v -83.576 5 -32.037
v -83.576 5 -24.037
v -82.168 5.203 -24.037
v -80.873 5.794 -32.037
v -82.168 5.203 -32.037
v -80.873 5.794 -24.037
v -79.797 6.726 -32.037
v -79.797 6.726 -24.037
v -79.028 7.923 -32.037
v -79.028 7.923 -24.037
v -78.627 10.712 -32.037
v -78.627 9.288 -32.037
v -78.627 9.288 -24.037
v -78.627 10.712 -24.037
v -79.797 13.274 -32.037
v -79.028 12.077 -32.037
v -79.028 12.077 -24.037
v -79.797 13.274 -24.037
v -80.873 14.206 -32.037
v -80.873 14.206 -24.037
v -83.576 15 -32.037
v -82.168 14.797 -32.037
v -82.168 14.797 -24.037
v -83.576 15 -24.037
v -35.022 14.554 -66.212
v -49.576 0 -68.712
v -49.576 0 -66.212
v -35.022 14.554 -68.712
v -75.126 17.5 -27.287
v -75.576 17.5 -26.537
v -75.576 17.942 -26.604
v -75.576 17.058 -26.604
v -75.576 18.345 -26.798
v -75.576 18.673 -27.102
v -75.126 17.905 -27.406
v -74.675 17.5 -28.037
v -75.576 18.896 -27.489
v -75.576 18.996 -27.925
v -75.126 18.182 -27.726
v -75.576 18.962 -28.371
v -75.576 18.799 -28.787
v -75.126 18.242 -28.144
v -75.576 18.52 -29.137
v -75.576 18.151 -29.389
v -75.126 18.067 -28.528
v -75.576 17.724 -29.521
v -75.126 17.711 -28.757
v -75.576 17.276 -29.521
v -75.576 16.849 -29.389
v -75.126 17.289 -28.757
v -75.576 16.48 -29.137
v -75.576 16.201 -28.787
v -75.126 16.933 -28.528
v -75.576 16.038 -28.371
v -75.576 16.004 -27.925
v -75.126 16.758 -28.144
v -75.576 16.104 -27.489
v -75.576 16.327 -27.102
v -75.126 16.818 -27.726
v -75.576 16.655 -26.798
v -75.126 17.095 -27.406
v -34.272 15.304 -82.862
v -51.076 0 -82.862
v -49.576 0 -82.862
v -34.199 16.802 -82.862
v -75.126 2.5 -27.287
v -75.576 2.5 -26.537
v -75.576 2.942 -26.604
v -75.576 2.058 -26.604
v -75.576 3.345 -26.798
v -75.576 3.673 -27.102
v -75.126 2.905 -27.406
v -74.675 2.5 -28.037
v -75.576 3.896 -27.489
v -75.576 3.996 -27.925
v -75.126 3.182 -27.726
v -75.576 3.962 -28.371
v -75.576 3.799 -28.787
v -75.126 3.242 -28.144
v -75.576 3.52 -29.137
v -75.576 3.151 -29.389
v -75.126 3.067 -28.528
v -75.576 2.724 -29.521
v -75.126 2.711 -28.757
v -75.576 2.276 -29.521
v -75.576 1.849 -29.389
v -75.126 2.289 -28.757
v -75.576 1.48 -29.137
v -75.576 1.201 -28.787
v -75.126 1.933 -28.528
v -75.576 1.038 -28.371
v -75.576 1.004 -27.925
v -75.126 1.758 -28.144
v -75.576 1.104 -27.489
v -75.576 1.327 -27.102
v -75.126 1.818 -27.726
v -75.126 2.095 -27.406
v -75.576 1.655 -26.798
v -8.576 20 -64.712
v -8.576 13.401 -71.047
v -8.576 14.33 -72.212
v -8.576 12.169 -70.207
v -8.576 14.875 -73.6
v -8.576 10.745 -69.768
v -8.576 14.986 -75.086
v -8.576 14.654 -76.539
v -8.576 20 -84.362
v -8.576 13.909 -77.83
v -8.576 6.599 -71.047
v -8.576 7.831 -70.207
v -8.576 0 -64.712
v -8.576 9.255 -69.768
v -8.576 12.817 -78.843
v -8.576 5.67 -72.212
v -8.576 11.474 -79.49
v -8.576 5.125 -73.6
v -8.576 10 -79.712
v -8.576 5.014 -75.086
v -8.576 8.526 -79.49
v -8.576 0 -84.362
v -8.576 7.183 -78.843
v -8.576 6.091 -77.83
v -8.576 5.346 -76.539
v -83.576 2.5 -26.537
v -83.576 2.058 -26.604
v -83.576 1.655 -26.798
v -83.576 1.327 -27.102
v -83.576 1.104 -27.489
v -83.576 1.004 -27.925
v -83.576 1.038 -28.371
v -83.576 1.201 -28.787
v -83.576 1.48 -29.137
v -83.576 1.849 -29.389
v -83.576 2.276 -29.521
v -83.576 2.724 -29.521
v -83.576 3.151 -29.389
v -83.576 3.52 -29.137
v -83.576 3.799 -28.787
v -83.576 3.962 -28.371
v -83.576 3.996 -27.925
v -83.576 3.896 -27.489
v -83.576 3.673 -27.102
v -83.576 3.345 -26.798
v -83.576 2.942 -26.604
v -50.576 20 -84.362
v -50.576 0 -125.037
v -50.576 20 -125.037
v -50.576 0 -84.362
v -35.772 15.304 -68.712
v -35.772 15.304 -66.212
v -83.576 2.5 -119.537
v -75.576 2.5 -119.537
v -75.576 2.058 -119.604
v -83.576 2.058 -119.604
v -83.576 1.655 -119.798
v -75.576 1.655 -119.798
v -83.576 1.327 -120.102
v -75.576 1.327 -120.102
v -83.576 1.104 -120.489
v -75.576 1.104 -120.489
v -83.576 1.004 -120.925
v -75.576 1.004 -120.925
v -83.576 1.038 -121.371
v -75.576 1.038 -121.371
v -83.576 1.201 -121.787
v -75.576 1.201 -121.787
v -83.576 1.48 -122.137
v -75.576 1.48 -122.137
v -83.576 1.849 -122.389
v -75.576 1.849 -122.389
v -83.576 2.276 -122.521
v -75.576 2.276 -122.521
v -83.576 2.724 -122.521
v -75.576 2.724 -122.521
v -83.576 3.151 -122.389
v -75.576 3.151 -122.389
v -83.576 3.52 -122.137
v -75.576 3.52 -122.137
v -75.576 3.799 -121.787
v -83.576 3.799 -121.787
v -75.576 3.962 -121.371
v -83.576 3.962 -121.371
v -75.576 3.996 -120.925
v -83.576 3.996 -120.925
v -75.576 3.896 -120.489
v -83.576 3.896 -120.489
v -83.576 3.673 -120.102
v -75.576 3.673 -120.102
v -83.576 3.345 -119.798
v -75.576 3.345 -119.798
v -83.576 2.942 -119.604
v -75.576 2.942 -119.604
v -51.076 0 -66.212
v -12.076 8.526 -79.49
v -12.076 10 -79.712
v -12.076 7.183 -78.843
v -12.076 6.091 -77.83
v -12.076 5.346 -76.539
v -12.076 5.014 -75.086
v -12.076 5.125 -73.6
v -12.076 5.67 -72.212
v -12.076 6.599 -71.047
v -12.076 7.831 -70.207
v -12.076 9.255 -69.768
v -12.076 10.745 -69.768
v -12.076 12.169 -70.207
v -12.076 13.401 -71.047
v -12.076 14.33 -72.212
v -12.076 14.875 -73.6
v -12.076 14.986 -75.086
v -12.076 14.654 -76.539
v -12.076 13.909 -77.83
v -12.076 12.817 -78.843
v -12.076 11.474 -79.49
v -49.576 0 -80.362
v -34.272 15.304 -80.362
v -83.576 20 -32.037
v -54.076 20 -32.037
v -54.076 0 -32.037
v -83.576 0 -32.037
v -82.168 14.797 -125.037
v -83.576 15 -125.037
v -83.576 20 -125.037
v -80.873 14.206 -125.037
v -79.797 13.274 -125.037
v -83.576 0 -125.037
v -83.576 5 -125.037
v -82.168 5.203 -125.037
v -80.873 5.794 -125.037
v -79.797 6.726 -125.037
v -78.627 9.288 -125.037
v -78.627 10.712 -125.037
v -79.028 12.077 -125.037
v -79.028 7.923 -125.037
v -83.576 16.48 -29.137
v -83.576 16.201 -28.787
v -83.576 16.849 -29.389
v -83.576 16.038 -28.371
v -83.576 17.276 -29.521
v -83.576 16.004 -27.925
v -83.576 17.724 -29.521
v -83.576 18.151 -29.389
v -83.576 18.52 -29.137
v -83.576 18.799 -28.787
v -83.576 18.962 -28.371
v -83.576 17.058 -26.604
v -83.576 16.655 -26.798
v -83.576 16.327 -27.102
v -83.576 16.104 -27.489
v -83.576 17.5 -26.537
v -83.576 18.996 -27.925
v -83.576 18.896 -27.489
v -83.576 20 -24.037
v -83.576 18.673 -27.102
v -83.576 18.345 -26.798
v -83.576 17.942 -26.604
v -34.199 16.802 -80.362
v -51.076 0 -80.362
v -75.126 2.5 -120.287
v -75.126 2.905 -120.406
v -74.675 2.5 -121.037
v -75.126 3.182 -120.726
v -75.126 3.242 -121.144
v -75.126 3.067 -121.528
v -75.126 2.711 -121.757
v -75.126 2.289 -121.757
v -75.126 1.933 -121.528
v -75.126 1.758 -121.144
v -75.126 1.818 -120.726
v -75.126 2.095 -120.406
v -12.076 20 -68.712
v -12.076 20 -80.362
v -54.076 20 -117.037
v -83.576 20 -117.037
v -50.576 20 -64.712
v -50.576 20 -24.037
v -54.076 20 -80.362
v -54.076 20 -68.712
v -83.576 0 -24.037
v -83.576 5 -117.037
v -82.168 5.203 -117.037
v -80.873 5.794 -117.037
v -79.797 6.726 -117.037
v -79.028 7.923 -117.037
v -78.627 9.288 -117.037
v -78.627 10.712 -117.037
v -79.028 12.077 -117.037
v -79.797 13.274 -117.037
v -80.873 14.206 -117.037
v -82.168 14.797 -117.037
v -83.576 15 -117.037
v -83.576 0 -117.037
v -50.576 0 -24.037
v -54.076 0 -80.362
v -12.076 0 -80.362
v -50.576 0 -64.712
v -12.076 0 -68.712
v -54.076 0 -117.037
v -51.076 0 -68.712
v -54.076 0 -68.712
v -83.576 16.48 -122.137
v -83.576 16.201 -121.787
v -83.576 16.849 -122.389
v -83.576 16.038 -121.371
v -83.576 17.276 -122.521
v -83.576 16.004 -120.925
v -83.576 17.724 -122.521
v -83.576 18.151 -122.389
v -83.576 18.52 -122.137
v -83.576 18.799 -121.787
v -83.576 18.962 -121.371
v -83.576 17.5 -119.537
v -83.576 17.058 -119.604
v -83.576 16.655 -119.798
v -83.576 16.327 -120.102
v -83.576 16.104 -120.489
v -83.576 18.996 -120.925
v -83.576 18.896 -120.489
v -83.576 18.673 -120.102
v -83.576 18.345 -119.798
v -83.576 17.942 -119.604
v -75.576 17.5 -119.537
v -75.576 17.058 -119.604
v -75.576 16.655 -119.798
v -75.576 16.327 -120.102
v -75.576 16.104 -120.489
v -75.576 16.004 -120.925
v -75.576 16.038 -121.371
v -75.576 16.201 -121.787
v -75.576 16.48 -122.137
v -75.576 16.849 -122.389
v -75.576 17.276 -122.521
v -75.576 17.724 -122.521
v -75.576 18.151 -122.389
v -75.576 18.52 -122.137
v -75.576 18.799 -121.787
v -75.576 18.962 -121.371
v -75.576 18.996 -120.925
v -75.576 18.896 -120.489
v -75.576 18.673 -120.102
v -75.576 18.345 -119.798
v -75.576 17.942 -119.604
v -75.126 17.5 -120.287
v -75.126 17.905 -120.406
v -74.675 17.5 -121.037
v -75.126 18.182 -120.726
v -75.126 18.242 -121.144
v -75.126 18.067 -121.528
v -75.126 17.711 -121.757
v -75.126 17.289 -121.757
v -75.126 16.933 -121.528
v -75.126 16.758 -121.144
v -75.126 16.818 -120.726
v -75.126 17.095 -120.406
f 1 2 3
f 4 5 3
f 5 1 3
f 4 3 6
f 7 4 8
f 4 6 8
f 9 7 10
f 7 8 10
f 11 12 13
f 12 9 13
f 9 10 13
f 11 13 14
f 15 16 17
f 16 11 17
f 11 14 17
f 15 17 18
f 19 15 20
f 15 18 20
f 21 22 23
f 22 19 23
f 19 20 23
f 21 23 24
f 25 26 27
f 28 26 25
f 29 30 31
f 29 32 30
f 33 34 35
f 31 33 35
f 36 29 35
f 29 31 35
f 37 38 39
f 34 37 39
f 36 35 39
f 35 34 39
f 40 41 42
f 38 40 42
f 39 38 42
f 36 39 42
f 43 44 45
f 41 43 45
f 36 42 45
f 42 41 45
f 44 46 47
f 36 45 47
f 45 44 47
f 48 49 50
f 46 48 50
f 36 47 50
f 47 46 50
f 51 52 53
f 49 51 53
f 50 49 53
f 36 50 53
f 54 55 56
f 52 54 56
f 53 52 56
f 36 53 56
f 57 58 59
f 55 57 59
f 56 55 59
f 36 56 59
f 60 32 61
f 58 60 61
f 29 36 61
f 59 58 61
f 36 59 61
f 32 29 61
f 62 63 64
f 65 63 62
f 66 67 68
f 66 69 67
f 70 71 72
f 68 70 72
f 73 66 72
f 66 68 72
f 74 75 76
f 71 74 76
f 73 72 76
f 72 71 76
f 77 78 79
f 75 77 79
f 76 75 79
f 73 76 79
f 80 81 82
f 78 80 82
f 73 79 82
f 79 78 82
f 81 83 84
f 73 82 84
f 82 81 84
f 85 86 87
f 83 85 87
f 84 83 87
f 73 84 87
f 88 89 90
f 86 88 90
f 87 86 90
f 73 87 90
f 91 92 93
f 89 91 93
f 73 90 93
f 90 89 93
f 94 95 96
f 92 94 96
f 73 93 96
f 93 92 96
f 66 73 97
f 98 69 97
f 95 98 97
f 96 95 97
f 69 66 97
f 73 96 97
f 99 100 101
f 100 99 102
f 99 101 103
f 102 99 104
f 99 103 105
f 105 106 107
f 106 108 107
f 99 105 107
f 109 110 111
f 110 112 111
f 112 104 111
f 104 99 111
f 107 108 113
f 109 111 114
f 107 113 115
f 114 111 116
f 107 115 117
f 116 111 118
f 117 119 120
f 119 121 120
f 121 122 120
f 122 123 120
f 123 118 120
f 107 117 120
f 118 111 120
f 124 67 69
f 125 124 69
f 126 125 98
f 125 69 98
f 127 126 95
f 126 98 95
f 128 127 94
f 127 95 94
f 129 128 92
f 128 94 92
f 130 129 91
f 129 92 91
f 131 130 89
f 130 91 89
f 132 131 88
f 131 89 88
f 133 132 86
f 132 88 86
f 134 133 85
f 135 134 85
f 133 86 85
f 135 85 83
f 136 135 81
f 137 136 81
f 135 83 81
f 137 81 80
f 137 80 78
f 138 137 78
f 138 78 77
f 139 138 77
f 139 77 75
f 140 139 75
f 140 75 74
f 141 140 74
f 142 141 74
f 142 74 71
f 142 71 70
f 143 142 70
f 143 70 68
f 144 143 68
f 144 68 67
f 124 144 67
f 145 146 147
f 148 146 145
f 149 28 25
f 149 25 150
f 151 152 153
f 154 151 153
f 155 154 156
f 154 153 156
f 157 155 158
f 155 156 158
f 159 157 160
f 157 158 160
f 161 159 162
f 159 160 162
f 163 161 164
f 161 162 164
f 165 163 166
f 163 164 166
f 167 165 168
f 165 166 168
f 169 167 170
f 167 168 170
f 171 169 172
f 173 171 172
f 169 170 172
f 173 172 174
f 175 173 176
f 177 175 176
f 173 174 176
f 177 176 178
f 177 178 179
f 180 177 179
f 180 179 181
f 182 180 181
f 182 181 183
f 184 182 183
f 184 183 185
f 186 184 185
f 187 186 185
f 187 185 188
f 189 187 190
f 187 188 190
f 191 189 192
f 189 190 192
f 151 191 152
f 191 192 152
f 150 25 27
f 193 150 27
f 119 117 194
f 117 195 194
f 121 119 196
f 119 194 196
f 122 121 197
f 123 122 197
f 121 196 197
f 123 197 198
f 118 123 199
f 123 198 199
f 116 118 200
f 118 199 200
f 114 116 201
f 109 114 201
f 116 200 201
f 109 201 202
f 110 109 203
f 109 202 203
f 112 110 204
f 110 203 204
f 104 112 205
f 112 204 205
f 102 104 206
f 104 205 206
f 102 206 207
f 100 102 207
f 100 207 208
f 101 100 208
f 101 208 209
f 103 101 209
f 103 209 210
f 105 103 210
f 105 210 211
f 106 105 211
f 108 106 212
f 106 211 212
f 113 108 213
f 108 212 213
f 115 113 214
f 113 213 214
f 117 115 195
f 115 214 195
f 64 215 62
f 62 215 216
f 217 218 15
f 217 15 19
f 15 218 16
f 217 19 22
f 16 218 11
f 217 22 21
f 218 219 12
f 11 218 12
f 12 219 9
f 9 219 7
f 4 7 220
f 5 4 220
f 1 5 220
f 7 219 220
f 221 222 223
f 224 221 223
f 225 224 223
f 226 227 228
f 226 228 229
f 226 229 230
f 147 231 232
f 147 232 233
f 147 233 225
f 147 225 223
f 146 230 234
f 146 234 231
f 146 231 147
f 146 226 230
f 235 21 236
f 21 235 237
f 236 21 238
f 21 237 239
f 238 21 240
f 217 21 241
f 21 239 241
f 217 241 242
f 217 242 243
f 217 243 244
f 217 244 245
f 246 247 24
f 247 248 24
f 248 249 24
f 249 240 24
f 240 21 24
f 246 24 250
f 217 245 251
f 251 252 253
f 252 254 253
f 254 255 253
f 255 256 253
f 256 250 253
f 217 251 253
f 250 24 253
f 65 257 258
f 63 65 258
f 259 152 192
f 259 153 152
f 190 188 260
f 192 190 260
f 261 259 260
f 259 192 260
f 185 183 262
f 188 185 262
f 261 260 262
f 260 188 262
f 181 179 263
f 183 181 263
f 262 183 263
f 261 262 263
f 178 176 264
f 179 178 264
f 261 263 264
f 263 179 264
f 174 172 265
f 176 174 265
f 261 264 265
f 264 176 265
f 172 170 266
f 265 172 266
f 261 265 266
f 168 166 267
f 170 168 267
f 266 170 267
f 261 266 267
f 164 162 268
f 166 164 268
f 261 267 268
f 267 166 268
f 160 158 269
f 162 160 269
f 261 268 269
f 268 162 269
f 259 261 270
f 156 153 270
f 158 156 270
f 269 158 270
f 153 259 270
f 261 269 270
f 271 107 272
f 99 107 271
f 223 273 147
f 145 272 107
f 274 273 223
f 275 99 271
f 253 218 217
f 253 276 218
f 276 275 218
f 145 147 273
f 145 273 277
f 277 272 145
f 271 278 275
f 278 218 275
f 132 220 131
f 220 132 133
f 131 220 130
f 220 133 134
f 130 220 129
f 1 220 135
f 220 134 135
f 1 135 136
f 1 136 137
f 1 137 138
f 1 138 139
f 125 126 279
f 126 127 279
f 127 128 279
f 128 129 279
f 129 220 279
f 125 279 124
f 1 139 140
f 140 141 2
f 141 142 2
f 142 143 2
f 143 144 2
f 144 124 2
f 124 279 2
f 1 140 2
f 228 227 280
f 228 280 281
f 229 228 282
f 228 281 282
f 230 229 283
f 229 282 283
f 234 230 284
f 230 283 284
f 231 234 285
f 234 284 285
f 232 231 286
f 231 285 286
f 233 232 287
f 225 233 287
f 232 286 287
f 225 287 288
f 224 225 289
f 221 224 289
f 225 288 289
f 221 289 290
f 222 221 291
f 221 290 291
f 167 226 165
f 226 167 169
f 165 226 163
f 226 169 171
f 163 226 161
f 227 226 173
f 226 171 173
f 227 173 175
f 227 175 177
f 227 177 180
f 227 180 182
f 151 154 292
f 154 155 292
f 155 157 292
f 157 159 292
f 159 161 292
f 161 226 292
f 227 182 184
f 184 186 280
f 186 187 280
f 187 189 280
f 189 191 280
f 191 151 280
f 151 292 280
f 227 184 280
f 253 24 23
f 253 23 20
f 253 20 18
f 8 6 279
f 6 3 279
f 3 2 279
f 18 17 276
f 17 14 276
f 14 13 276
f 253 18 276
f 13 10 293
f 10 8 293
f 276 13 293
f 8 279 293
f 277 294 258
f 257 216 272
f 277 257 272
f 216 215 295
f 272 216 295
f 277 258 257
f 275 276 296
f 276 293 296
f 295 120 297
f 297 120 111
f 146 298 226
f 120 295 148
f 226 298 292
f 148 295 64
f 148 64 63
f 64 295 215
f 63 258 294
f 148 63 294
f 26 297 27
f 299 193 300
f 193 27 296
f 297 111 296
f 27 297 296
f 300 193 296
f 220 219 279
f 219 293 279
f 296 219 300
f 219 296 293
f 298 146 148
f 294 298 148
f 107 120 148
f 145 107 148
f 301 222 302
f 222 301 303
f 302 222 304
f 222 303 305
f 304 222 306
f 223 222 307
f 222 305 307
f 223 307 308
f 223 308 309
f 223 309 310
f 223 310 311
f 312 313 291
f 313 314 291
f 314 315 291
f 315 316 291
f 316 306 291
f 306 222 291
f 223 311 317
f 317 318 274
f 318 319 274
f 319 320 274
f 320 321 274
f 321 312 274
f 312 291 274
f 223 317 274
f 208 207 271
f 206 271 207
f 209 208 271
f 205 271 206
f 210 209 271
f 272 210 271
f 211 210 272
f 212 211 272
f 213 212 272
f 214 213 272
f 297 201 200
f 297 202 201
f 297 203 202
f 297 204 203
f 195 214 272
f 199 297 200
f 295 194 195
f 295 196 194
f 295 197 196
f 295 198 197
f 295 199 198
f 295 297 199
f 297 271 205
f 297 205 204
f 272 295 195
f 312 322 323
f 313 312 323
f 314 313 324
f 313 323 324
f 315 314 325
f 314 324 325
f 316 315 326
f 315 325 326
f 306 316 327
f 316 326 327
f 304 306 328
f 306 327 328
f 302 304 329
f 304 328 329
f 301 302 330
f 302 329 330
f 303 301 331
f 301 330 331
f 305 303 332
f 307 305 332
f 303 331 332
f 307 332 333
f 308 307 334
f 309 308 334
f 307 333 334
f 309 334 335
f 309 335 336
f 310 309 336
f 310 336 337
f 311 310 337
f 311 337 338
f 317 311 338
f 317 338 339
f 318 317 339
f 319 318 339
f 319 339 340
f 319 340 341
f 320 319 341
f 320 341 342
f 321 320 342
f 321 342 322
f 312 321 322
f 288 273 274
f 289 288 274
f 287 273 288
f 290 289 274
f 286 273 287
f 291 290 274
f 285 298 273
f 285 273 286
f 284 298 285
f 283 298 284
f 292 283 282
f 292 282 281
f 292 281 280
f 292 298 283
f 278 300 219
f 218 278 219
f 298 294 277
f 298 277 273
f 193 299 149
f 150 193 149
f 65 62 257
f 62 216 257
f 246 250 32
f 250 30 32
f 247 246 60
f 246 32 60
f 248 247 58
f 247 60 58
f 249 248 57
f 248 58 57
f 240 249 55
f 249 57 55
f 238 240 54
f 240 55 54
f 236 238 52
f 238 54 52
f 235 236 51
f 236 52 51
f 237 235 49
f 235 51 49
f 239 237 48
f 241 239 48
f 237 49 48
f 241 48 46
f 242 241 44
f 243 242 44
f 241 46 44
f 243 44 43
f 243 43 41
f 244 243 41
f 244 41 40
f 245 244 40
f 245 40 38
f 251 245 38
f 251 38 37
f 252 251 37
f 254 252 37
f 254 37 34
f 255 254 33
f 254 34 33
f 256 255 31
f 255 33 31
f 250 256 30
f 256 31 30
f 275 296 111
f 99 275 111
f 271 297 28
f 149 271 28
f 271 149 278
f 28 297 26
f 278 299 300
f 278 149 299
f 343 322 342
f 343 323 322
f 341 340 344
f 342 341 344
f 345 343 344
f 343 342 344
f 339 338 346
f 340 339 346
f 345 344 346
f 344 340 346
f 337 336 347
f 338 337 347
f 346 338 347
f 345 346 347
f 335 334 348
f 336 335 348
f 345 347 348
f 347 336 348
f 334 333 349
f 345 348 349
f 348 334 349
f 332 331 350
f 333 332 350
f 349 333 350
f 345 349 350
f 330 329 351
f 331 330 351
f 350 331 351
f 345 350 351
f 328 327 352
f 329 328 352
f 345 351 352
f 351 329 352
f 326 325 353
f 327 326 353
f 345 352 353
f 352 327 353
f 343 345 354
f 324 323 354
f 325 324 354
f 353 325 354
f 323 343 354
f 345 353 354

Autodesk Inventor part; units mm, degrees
ref_plane "YZ Plane" through (0, 0, 0) normal (1, 0, 0) x (0, 1, 0)
ref_plane "XZ Plane" through (0, 0, 0) normal (0, 1, 0) x (-1, 0, 0)
ref_plane "XY Plane" through (0, 0, 0) normal (0, 0, 1) x (1, 0, 0)
sketch "Skizze1" plane through (0, 0, 0) normal (0, 1, 0) x (-1, 0, 0)
  line L0 (50.5762, -64.7123) -> (8.5762, -64.7123)
  line L1 (8.5762, -64.7123) -> (8.5762, -84.3623)
  line L2 (8.5762, -84.3623) -> (50.5762, -84.3623)
  line L3 (54.0762, -68.7123) -> (54.0762, -32.0373)
  line L4 (54.0762, -32.0373) -> (108.5762, -32.0373)
  line L5 (108.5762, -32.0373) -> (108.5762, -24.0373)
  line L6 (108.5762, -24.0373) -> (50.5762, -24.0373)
  line L7 (50.5762, -24.0373) -> (50.5762, -64.7123)
  line L8 (54.0762, -117.0373) -> (108.5762, -117.0373)
  line L9 (108.5762, -117.0373) -> (108.5762, -125.0373)
  line L10 (108.5762, -125.0373) -> (50.5762, -125.0373)
  line L11 (50.5762, -125.0373) -> (50.5762, -84.3623)
  line L12 (54.0762, -80.3623) -> (54.0762, -117.0373)
  line L13 (12.0762, -68.7123) -> (12.0762, -80.3623)
  line L14 (12.0762, -68.7123) -> (54.0762, -68.7123)
  line L15 (54.0762, -80.3623) -> (12.0762, -80.3623)
  point P0 (0, 0)
  dimension "d1" = 8
  dimension "d2" = 3.5
  dimension "d5" = 8
  dimension "d9" = 4
  dimension "d10" = 100
  dimension "d11" = 11.65
  dimension "d27" = 3.5
  dimension "d29" = 42
  dimension "d30" = 85
  dimension "d31" = 36.675
extrude "Extrusion1" add sketch "Skizze1" along normal blind 20
sketch "Skizze3" plane through (-12.0762, 0, -68.7123) normal (0, 0, -1) x (-1, 0, 0)
  line L0 (39, 0) -> (23.696, 15.304)
  line L1 (37.5, 0) -> (22.946, 14.554)
  line L2 (22.946, 14.554) -> (23.696, 15.304)
  line L3 (42, 0) -> (42, 20) projected
  line L4 (42, -13) -> (42, 0)
  line L5 (37.5, 0) -> (39, 0)
  line L6 (0, 0) -> (42, 0) projected
  point P0 (-12.0762, 0)
  point P1 (-3.5, 0)
  dimension "d19" = 1.5
  dimension "d21" = 15.304
  dimension "d26" = 41
extrude "Extrusion3" cut sketch "Skizze3" against normal blind 2.5
sketch "Skizze4" plane through (-108.5762, 0, -24.0373) normal (0, 0, 1) x (1, 0, 0)
  line L0 (0, 0) -> (0, 20) projected
  circle A0 centre (0, 10) radius 5
  point P0 (108.5762, 0)
  dimension "d32" = 10
extrude "Extrusion4" cut sketch "Skizze4" against normal blind 200
sketch "Skizze5" plane through (-54.0762, 0, -80.3623) normal (0, 0, 1) x (1, 0, 0)
  point P0 (54.0762, 0)
sketch "Skizze6" plane through (-54.0762, 0, -80.3623) normal (0, 0, 1) x (1, 0, 0)
  line L0 (0, 0) -> (42, 0) projected
  line L1 (4.5, 0) -> (19.804, 15.304)
  line L2 (19.804, 15.304) -> (19.8768, 16.8022)
  line L3 (19.8768, 16.8022) -> (3, 0)
  line L4 (0, 0) -> (0, -2.9867)
  line L5 (4.5, 0) -> (0, 0)
  point P0 (54.0762, 0)
  point P1 (45.5, 0)
  dimension "d35" = 45
  dimension "d36" = 15.304
  dimension "d37" = 1.5
  dimension "d38" = 1.5
  dimension "d39" = 41
extrude "Extrusion5" cut sketch "Skizze6" against normal blind 2.5
sketch "Skizze7" plane through (-108.5762, 20, -32.0373) normal (-1, 0, 0) x (0, 0, 1)
  line L0 (8, -5) -> (8, 0) projected
  line L1 (8, -15) -> (0, -15) projected
  line L2 (0, -5) -> (8, -5) projected
  line L3 (-93, -5) -> (-93, 0) projected
  point P0 (32.0373, -20)
  point P1 (4, -2.5)
  point P2 (3.7984, -17.5)
  point P3 (-89, -2.5)
  point P4 (-89, -17.5)
  dimension "d42" = 4
  dimension "d43" = 2.5
  dimension "d44" = 2.5
  dimension "d52" = 4
hole "Bohrung1" at (-108.5762, 17.5, -28.0373) at (-108.5762, 2.5, -28.2389) direction (1, 0, 0) diameter 2.75 depth 8 tip angle 118
sketch "Skizze8" plane through (-108.5762, 0, -125.0373) normal (-1, 0, 0) x (0, 0, 1)
  line L0 (8, 15) -> (8, 20) projected
  line L1 (0, 20) -> (8, 20) projected
  line L2 (0, 0) -> (8, 0) projected
  point P0 (125.0373, 0)
  point P1 (4, 17.5)
  point P2 (3.9503, 2.5)
  dimension "d53" = 4
  dimension "d54" = 2.5
  dimension "d55" = 2.5
hole "Bohrung2" at (-108.5762, 2.5, -121.087) at (-108.5762, 17.5, -121.0373) direction (1, 0, 0) diameter 2.75 depth 8 tip angle 118
sketch "Skizze9" plane through (-8.5762, 0, -64.7123) normal (1, 0, 0) x (0, 0, -1)
  line L0 (0, 0) -> (0, 20) projected
  line L1 (0, 0) -> (19.65, 0) projected
  point P0 (-64.7123, 0)
  point P1 (10, 10)
  dimension "d63" = 10
  dimension "d64" = 10
hole "Bohrung3" at (-8.5762, 10, -74.7123) direction (-1, 0, 0) diameter 10 depth 5 tip angle 118
sketch "Skizze12" plane through (-108.5762, 0, -24.0373) normal (0, 0, 1) x (1, 0, 0)
  line L0 (58, 20) -> (0, 20) projected
  line L1 (0, 0) -> (25, 0)
  line L2 (25, 0) -> (25, 20)
  line L3 (25, 20) -> (0, 20)
  line L4 (0, 20) -> (0, 0)
  point P0 (108.5762, 0)
  dimension "d75" = 25
  dimension "d76" = 20
extrude "Extrusion6" cut sketch "Skizze12" against normal blind 120
sketch "Skizze13" plane through (-50.5762, 0, -24.0373) normal (0, 0, 1) x (1, 0, 0)
  line L0 (-33, 0) -> (-33, 20) projected
  circle A0 centre (-33, 10) radius 5
  point P0 (50.5762, 0)
  dimension "d79" = 10
extrude "Extrusion7" cut sketch "Skizze13" against normal blind 120
sketch "Skizze14" plane through (-83.5762, 0, -32.0373) normal (-1, 0, 0) x (0, 0, 1)
  line L0 (8, 5) -> (0, 5) projected
  line L1 (0, 0) -> (0, 5) projected
  line L2 (0, 20) -> (8, 20) projected
  line L3 (8, 20) -> (8, 15) projected
  line L4 (-85, 5) -> (-93, 5) projected
  line L5 (-85, 5) -> (-85, 0) projected
  line L6 (-93, 20) -> (-85, 20) projected
  line L7 (-85, 20) -> (-85, 15) projected
  point P0 (32.0373, 0)
  point P1 (4, 2.5)
  point P2 (4, 17.5)
  point P3 (-89, 2.5)
  point P4 (-89, 17.5)
  dimension "d82" = 2.5
  dimension "d83" = 4
  dimension "d84" = 2.5
  dimension "d85" = 4
  dimension "d86" = 2.5
  dimension "d87" = 4
  dimension "d88" = 2.5
  dimension "d89" = 4
hole "Bohrung4" at (-83.5762, 2.5, -28.0373) at (-83.5762, 17.5, -28.0373) at (-83.5762, 17.5, -121.0373) at (-83.5762, 2.5, -121.0373) direction (1, 0, 0) diameter 3 depth 8 tip angle 118
ref_plane "Arbeitsebene3" through (-43.5762, 0, -64.7123) normal (1, 0, 0) x (0, 0, -1)
ref_plane "Arbeitsebene4" through (-83.5762, 17.5, -24.0373) normal (-1, 0, 0) x (0, 0, 1)
sketch "Skizze15" plane through (-83.5762, 17.5, -24.0373) normal (-1, 0, 0) x (0, 0, 1)
  point P0 (24.0373, -17.5)
  point P1 (-50.5568, -7.548)
sketch "Skizze16" plane through (-43.5762, 0, -64.7123) normal (1, 0, 0) x (0, 0, -1)
  point P0 (-64.7123, 0)
  point P1 (9.9474, 9.9802)
properties part number "Neue Grundplatte"
